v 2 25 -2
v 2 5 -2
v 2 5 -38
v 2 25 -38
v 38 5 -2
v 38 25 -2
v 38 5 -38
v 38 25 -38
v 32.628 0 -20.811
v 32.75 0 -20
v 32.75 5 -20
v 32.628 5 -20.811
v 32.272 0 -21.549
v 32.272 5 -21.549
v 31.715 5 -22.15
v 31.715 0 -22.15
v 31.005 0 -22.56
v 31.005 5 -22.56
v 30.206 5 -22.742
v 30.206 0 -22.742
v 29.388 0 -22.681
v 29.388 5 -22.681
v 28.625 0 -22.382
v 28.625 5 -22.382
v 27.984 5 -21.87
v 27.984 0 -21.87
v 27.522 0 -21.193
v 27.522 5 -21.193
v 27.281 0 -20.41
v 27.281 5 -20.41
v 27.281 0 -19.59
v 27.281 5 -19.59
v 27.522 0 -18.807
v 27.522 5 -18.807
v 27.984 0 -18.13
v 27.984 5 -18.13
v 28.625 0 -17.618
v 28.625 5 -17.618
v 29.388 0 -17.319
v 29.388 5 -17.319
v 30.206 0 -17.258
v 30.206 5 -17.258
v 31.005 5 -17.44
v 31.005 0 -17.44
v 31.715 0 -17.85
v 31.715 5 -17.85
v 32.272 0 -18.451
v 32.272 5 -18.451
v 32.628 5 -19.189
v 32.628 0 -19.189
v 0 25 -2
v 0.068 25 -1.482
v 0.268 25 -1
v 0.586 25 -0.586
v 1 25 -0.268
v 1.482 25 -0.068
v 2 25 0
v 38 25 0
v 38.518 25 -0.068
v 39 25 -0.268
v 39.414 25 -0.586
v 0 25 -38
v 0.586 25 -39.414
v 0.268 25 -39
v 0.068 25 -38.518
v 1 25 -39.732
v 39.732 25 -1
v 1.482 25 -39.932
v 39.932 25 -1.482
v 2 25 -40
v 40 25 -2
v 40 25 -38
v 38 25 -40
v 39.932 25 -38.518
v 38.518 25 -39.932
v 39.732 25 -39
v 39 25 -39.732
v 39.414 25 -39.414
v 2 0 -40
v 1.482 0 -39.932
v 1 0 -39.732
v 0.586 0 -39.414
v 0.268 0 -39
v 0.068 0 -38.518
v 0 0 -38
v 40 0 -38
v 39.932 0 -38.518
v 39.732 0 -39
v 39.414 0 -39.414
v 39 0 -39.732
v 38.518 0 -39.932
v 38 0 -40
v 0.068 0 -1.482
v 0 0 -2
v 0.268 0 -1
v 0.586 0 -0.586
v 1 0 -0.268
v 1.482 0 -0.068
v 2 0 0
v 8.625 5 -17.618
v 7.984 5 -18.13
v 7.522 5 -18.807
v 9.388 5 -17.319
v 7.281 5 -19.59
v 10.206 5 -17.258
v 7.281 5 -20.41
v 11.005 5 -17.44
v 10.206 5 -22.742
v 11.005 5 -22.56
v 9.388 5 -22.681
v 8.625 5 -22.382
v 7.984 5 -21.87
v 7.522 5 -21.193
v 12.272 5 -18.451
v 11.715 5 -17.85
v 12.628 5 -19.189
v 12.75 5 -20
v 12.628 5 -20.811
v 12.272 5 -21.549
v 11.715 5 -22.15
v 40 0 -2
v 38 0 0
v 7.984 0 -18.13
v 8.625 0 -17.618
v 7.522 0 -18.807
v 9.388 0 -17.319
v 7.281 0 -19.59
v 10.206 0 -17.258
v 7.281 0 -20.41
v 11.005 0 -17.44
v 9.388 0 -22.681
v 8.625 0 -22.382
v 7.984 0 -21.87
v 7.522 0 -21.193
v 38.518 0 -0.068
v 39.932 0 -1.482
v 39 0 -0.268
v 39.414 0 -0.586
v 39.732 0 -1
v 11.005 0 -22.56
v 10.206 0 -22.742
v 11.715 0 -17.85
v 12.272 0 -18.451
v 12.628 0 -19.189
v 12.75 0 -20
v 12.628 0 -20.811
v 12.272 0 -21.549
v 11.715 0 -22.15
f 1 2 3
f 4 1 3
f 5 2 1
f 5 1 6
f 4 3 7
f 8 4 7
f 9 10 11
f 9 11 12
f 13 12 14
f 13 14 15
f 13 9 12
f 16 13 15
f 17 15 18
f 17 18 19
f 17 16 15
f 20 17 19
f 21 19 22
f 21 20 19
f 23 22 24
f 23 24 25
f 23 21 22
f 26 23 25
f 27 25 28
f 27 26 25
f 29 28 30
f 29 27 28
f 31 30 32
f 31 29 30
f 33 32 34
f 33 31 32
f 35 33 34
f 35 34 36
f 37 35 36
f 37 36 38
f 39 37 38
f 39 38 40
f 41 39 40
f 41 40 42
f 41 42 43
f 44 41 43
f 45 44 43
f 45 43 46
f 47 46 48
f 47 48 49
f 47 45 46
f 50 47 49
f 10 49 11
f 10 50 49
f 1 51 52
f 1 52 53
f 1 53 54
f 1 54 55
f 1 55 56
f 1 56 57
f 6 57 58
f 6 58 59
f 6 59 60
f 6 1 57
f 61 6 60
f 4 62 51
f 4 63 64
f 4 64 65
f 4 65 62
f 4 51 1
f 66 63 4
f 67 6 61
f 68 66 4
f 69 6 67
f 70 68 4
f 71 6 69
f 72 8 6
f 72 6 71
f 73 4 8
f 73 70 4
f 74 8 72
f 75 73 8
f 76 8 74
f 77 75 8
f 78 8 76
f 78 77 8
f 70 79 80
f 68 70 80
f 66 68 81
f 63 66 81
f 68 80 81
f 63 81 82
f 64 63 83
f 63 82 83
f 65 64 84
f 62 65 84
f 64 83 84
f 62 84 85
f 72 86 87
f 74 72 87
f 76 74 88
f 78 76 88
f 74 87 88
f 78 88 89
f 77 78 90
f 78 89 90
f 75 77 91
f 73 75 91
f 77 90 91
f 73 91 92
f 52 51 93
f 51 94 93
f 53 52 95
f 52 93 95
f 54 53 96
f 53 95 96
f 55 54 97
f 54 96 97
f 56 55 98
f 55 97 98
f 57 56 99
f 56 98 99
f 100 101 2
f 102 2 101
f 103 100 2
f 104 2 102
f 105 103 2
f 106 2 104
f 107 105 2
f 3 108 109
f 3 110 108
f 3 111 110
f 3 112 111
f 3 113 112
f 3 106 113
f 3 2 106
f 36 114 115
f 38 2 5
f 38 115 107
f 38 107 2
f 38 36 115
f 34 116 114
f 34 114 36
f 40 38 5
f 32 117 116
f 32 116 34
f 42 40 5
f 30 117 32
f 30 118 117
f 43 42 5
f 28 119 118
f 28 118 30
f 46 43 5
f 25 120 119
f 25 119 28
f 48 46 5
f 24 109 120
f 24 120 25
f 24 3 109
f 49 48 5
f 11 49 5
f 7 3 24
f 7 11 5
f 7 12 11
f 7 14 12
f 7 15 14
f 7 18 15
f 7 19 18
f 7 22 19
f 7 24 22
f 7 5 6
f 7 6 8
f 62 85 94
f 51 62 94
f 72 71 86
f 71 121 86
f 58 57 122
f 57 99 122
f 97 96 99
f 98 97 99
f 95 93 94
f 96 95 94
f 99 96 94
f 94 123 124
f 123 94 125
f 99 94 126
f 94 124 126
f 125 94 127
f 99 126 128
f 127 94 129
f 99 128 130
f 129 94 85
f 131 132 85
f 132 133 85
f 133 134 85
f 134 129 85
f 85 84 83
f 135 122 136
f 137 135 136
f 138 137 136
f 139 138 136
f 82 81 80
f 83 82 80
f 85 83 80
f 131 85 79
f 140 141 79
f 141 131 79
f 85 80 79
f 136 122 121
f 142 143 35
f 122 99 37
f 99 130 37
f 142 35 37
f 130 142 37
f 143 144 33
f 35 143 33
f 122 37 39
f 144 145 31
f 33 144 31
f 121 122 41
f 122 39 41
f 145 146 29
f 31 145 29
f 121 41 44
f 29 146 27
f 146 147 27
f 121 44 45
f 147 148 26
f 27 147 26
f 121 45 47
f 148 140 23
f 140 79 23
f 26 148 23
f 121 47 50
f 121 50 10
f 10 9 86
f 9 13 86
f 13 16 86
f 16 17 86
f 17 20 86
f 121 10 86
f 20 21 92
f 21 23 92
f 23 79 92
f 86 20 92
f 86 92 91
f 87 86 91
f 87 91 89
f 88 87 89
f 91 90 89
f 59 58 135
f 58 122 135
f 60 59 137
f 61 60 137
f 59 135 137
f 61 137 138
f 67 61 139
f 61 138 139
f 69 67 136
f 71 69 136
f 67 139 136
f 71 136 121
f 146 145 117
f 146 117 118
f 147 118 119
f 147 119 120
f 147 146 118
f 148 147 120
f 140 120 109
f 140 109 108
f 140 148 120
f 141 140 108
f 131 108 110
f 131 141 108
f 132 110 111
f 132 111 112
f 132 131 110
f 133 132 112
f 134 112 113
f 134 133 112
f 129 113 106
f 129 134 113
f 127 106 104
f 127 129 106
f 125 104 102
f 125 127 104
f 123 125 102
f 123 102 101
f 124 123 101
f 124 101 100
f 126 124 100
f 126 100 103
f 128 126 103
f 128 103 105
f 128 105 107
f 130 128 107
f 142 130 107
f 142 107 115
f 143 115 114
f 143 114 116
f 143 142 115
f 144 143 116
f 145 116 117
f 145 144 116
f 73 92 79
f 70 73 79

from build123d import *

# Parameters (mm, degrees)
SKETCH1_R           = 2.75
BASE_DEPTH          = 5
SKETCH3_W           = 36
SKETCH3_H           = 36
BOSS_EXTRUDE2_DEPTH = 20


with BuildPart() as part:
    # Sketch1 → base (new body)
    with BuildSketch(Plane(origin=(0, 0, 0), x_dir=(1, 0, 0), z_dir=(0, 1, 0))):
        with BuildLine():
            Line((2, 0), (38, 0))
            ThreePointArc((38, 0), (39.414213562, 0.585786438), (40, 2))
            Line((40, 2), (40, 38))
            ThreePointArc((40, 38), (39.414213562, 39.414213562), (38, 40))
            Line((38, 40), (2, 40))
            ThreePointArc((2, 40), (0.585786438, 39.414213562), (0, 38))
            Line((0, 38), (0, 2))
            ThreePointArc((0, 2), (0.585786438, 0.585786438), (2, 0))
        make_face()
        with Locations((10, 20)):
            Circle(SKETCH1_R, mode=Mode.SUBTRACT)
        with Locations((30, 20)):
            Circle(SKETCH1_R, mode=Mode.SUBTRACT)
    extrude(amount=BASE_DEPTH)

    # Sketch3 → Boss-Extrude2 (add)
    with BuildSketch(Plane(origin=(0, 5, 0), x_dir=(1, 0, 0), z_dir=(0, 1, 0))):
        with BuildLine():
            Line((0, 38), (0, 2))
            ThreePointArc((0, 2), (0.585786438, 0.585786438), (2, 0))
            Line((2, 0), (38, 0))
            ThreePointArc((38, 0), (39.414213562, 0.585786438), (40, 2))
            Line((40, 2), (40, 38))
            ThreePointArc((40, 38), (39.414213562, 39.414213562), (38, 40))
            Line((38, 40), (2, 40))
            ThreePointArc((2, 40), (0.585786438, 39.414213562), (0, 38))
        make_face()
        with Locations((20, 20)):
            Rectangle(SKETCH3_W, SKETCH3_H, mode=Mode.SUBTRACT)
    extrude(amount=BOSS_EXTRUDE2_DEPTH)


solid = part.part
